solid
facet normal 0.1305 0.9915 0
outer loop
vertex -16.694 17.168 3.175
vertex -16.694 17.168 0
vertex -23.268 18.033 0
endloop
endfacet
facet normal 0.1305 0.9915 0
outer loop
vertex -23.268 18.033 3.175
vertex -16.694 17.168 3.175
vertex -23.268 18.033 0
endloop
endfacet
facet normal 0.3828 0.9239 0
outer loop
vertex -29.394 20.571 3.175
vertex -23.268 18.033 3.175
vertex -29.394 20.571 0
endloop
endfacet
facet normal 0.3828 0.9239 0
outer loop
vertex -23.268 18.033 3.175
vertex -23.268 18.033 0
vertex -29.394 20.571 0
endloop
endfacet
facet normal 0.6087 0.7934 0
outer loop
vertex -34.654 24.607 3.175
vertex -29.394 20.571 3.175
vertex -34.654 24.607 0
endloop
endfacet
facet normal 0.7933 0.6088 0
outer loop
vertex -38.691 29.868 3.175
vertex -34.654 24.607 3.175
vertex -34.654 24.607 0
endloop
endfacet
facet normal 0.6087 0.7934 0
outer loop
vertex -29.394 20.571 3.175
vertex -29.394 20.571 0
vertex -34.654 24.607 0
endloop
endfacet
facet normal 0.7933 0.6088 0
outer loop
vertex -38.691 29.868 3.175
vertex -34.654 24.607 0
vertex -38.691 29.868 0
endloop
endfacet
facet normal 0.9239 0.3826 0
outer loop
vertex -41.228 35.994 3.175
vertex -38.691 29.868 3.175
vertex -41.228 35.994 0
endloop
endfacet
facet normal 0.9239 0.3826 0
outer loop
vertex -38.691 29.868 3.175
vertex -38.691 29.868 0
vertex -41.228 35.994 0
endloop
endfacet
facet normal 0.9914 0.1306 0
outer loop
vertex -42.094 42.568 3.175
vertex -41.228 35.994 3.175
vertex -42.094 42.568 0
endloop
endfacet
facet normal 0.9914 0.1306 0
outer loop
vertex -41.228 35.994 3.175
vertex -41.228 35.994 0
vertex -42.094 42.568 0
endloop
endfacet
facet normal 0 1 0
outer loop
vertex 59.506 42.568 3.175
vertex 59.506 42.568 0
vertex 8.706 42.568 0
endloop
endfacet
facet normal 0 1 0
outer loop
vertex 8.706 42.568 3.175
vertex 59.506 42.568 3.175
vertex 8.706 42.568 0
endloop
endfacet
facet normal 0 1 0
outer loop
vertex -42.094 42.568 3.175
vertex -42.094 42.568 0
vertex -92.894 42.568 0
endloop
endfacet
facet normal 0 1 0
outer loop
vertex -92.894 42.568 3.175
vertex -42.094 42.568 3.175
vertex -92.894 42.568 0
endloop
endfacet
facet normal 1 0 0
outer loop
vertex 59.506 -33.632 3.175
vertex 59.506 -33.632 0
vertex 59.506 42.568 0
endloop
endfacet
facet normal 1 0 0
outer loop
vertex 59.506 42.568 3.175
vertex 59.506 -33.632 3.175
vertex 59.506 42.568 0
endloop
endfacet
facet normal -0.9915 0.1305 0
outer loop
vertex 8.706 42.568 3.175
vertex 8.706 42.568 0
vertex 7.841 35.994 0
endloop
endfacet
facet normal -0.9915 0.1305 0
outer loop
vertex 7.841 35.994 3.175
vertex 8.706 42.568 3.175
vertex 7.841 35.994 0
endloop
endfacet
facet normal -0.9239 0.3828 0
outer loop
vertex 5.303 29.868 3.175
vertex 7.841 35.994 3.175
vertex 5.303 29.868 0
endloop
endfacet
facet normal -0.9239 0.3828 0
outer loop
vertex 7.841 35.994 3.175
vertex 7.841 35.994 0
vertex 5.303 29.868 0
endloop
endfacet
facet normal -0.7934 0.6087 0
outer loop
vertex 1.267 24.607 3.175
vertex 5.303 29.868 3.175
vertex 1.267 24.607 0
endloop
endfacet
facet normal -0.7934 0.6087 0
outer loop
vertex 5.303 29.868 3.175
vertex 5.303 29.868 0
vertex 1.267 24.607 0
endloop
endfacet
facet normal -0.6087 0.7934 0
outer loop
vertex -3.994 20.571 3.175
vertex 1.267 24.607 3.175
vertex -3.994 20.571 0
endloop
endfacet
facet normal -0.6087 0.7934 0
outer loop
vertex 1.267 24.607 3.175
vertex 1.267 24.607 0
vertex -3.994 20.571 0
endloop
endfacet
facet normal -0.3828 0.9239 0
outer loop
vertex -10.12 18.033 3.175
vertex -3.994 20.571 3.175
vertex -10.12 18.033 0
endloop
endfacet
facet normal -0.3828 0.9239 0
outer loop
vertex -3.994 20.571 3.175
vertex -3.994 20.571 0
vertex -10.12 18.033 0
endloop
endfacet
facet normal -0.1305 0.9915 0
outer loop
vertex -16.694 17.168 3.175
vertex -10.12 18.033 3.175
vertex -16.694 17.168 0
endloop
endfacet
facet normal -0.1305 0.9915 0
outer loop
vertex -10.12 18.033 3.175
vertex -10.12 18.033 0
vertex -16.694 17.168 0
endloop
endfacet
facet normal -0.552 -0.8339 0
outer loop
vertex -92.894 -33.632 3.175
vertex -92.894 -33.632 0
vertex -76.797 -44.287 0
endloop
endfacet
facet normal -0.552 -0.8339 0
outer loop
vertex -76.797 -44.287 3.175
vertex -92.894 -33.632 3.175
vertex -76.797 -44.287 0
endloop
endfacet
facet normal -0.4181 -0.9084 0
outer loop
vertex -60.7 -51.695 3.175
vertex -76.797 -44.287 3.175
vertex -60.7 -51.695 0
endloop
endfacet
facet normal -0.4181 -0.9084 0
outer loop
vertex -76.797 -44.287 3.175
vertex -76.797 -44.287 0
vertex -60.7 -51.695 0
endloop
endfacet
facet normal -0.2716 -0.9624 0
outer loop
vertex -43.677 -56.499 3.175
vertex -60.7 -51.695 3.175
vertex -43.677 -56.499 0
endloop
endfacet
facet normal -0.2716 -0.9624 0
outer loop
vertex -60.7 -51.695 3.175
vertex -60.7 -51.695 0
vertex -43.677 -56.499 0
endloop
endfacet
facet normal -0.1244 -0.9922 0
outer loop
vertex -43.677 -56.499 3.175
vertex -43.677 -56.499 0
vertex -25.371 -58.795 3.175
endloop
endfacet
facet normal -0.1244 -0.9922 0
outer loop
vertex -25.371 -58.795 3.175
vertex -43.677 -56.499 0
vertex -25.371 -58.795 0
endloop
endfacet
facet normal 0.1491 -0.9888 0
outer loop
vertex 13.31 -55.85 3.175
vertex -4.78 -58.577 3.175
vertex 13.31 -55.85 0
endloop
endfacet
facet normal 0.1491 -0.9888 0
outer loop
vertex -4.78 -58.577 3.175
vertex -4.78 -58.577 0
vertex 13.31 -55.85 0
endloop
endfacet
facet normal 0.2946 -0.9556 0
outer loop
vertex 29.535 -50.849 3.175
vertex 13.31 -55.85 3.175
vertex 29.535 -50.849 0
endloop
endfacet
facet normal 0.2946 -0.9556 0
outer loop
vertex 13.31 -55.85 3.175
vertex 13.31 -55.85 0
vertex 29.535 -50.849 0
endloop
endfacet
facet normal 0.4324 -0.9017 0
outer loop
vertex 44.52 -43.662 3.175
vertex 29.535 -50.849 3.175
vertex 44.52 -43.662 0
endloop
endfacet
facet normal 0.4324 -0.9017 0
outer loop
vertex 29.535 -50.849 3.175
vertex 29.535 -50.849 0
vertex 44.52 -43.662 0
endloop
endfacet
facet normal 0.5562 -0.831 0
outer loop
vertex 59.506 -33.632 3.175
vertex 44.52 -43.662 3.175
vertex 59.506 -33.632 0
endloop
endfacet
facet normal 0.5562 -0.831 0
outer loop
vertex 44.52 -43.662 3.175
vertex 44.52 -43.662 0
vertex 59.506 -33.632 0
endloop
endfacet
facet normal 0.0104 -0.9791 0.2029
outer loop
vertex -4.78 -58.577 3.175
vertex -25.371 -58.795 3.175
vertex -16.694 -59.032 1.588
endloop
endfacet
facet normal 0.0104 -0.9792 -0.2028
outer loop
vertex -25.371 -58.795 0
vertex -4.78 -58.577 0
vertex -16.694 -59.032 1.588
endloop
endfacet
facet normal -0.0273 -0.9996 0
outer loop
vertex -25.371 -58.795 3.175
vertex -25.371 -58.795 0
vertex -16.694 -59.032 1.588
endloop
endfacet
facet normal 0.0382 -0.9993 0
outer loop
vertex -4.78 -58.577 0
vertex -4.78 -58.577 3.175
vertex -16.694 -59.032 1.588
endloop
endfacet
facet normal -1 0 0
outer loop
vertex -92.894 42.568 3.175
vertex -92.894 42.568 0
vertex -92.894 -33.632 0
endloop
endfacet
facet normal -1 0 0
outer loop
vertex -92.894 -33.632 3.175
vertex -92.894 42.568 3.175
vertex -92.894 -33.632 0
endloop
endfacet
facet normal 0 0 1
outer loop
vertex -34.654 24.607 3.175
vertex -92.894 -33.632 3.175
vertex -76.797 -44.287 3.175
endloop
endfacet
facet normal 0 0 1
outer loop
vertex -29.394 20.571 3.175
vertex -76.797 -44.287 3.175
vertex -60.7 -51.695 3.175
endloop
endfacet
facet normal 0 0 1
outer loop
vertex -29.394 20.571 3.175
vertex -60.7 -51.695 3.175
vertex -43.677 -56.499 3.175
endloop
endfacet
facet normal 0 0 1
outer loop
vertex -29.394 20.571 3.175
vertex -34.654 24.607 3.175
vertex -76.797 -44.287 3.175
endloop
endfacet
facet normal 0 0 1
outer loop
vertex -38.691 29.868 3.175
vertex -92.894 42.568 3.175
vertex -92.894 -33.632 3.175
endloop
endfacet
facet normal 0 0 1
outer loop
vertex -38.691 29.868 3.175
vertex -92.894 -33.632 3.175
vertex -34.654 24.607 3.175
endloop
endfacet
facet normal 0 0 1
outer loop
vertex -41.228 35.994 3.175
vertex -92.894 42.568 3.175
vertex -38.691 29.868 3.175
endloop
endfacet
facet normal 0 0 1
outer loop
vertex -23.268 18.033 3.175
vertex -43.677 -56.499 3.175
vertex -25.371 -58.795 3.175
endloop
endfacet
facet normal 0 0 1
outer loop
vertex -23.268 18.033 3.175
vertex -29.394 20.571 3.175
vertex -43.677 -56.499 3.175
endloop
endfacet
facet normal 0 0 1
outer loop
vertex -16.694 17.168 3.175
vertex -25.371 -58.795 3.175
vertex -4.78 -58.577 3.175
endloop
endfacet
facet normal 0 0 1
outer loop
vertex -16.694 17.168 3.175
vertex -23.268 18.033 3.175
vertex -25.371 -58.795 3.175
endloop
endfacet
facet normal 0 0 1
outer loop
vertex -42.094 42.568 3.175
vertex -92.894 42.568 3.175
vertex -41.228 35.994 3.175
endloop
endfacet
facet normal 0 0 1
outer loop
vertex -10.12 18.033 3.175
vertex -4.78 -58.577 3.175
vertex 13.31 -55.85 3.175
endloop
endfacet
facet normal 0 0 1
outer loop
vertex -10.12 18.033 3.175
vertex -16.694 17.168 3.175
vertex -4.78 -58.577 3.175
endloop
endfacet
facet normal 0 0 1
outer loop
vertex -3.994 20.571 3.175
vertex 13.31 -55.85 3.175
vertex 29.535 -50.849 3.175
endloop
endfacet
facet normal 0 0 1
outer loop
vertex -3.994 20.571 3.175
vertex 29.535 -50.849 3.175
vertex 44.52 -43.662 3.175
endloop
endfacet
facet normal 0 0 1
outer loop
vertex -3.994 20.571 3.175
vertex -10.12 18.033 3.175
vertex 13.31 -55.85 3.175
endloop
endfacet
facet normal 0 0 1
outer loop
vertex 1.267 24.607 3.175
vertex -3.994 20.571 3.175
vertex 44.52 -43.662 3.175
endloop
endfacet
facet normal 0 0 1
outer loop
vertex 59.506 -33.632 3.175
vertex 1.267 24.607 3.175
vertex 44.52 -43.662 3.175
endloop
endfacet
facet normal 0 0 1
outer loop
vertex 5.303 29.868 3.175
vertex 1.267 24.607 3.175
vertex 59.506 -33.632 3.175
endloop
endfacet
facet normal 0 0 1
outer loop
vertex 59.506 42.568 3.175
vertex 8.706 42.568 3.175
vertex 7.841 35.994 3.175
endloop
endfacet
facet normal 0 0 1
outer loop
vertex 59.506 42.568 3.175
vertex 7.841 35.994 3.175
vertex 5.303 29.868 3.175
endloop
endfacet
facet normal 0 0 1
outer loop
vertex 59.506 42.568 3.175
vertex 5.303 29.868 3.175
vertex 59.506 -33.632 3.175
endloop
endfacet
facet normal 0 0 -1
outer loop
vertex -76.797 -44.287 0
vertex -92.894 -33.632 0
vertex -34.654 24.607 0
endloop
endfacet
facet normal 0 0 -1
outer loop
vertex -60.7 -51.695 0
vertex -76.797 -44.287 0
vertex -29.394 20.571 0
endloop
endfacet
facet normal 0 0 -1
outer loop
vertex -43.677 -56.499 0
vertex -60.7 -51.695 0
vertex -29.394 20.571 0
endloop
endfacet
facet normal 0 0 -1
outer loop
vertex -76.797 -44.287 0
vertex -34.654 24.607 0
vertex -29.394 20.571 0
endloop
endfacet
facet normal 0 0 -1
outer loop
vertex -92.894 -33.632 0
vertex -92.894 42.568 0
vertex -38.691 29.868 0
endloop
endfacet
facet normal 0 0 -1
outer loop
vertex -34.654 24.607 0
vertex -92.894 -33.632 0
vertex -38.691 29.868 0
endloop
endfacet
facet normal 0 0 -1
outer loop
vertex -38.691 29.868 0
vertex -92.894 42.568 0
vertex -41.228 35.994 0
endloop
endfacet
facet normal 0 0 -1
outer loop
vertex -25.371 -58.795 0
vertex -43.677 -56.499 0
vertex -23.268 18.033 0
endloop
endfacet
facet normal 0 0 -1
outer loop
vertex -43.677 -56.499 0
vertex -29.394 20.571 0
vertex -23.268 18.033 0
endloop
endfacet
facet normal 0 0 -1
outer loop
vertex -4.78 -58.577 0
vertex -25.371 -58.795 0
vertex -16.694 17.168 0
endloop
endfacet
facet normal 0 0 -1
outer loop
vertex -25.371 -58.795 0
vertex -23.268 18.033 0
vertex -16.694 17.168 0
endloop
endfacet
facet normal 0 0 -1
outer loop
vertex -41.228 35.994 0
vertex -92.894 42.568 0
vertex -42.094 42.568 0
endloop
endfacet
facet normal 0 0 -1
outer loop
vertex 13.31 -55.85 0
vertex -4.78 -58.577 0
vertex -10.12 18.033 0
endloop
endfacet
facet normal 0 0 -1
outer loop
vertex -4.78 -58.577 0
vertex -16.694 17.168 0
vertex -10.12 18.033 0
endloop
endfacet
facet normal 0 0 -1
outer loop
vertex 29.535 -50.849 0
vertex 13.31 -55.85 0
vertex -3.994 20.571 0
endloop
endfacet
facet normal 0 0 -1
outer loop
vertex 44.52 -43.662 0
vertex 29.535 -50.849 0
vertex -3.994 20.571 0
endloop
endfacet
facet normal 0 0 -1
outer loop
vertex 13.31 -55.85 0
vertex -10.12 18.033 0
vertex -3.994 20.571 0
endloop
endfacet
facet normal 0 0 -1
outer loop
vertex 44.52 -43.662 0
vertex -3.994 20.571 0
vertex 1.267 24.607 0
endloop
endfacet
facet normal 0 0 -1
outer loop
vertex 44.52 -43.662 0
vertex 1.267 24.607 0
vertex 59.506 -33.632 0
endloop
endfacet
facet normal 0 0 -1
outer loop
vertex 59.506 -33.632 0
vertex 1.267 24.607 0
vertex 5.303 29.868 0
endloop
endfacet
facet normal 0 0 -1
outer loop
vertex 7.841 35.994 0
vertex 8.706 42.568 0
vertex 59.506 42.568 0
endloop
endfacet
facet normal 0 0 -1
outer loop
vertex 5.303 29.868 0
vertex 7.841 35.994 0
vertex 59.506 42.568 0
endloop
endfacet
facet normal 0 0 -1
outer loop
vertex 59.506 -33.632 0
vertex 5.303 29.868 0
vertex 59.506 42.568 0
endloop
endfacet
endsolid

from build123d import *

# Parameters (mm, degrees)
F1_DEPTH = 3.175


# Not quite as in the source:
# - a length typed as a fraction of an inch, garbled in the dataset ("3 / 203.2 mm" for 3/8 in), is restored


with BuildPart() as f1:
    # F0 (on Top) → F1 (new body)
    with BuildSketch(Plane.XY):
        with BuildLine():
            Line((-67.493813857, 42.5679214677), (-92.893813857, 42.5679214677))
            Line((-92.893813857, 42.5679214677), (-92.893813857, -33.6320785323))
            add(Edge.make_bspline(
                [(-92.893813857, -33.6320785323), (-67.493813857, -53.2479426065), (-16.693813857, -64.816214458), (34.106186143, -53.2479426065), (59.506186143, -33.6320785323)],
                knots=[0, 0, 0, 0, 0.5, 1, 1, 1, 1], degree=3))
            Line((59.506186143, -33.6320785323), (59.506186143, 42.5679214677))
            Line((59.506186143, 42.5679214677), (34.106186143, 42.5679214677))
            Line((34.106186143, 42.5679214677), (8.706186143, 42.5679214677))
            ThreePointArc((8.706186143, 42.5679214677), (1.2666983851, 24.6074092256), (-16.693813857, 17.1679214677))
            ThreePointArc((-16.693813857, 17.1679214677), (-34.6543260992, 24.6074092256), (-42.093813857, 42.5679214677))
            Line((-42.093813857, 42.5679214677), (-67.493813857, 42.5679214677))
        make_face()
    extrude(amount=F1_DEPTH)


solid = f1.part
